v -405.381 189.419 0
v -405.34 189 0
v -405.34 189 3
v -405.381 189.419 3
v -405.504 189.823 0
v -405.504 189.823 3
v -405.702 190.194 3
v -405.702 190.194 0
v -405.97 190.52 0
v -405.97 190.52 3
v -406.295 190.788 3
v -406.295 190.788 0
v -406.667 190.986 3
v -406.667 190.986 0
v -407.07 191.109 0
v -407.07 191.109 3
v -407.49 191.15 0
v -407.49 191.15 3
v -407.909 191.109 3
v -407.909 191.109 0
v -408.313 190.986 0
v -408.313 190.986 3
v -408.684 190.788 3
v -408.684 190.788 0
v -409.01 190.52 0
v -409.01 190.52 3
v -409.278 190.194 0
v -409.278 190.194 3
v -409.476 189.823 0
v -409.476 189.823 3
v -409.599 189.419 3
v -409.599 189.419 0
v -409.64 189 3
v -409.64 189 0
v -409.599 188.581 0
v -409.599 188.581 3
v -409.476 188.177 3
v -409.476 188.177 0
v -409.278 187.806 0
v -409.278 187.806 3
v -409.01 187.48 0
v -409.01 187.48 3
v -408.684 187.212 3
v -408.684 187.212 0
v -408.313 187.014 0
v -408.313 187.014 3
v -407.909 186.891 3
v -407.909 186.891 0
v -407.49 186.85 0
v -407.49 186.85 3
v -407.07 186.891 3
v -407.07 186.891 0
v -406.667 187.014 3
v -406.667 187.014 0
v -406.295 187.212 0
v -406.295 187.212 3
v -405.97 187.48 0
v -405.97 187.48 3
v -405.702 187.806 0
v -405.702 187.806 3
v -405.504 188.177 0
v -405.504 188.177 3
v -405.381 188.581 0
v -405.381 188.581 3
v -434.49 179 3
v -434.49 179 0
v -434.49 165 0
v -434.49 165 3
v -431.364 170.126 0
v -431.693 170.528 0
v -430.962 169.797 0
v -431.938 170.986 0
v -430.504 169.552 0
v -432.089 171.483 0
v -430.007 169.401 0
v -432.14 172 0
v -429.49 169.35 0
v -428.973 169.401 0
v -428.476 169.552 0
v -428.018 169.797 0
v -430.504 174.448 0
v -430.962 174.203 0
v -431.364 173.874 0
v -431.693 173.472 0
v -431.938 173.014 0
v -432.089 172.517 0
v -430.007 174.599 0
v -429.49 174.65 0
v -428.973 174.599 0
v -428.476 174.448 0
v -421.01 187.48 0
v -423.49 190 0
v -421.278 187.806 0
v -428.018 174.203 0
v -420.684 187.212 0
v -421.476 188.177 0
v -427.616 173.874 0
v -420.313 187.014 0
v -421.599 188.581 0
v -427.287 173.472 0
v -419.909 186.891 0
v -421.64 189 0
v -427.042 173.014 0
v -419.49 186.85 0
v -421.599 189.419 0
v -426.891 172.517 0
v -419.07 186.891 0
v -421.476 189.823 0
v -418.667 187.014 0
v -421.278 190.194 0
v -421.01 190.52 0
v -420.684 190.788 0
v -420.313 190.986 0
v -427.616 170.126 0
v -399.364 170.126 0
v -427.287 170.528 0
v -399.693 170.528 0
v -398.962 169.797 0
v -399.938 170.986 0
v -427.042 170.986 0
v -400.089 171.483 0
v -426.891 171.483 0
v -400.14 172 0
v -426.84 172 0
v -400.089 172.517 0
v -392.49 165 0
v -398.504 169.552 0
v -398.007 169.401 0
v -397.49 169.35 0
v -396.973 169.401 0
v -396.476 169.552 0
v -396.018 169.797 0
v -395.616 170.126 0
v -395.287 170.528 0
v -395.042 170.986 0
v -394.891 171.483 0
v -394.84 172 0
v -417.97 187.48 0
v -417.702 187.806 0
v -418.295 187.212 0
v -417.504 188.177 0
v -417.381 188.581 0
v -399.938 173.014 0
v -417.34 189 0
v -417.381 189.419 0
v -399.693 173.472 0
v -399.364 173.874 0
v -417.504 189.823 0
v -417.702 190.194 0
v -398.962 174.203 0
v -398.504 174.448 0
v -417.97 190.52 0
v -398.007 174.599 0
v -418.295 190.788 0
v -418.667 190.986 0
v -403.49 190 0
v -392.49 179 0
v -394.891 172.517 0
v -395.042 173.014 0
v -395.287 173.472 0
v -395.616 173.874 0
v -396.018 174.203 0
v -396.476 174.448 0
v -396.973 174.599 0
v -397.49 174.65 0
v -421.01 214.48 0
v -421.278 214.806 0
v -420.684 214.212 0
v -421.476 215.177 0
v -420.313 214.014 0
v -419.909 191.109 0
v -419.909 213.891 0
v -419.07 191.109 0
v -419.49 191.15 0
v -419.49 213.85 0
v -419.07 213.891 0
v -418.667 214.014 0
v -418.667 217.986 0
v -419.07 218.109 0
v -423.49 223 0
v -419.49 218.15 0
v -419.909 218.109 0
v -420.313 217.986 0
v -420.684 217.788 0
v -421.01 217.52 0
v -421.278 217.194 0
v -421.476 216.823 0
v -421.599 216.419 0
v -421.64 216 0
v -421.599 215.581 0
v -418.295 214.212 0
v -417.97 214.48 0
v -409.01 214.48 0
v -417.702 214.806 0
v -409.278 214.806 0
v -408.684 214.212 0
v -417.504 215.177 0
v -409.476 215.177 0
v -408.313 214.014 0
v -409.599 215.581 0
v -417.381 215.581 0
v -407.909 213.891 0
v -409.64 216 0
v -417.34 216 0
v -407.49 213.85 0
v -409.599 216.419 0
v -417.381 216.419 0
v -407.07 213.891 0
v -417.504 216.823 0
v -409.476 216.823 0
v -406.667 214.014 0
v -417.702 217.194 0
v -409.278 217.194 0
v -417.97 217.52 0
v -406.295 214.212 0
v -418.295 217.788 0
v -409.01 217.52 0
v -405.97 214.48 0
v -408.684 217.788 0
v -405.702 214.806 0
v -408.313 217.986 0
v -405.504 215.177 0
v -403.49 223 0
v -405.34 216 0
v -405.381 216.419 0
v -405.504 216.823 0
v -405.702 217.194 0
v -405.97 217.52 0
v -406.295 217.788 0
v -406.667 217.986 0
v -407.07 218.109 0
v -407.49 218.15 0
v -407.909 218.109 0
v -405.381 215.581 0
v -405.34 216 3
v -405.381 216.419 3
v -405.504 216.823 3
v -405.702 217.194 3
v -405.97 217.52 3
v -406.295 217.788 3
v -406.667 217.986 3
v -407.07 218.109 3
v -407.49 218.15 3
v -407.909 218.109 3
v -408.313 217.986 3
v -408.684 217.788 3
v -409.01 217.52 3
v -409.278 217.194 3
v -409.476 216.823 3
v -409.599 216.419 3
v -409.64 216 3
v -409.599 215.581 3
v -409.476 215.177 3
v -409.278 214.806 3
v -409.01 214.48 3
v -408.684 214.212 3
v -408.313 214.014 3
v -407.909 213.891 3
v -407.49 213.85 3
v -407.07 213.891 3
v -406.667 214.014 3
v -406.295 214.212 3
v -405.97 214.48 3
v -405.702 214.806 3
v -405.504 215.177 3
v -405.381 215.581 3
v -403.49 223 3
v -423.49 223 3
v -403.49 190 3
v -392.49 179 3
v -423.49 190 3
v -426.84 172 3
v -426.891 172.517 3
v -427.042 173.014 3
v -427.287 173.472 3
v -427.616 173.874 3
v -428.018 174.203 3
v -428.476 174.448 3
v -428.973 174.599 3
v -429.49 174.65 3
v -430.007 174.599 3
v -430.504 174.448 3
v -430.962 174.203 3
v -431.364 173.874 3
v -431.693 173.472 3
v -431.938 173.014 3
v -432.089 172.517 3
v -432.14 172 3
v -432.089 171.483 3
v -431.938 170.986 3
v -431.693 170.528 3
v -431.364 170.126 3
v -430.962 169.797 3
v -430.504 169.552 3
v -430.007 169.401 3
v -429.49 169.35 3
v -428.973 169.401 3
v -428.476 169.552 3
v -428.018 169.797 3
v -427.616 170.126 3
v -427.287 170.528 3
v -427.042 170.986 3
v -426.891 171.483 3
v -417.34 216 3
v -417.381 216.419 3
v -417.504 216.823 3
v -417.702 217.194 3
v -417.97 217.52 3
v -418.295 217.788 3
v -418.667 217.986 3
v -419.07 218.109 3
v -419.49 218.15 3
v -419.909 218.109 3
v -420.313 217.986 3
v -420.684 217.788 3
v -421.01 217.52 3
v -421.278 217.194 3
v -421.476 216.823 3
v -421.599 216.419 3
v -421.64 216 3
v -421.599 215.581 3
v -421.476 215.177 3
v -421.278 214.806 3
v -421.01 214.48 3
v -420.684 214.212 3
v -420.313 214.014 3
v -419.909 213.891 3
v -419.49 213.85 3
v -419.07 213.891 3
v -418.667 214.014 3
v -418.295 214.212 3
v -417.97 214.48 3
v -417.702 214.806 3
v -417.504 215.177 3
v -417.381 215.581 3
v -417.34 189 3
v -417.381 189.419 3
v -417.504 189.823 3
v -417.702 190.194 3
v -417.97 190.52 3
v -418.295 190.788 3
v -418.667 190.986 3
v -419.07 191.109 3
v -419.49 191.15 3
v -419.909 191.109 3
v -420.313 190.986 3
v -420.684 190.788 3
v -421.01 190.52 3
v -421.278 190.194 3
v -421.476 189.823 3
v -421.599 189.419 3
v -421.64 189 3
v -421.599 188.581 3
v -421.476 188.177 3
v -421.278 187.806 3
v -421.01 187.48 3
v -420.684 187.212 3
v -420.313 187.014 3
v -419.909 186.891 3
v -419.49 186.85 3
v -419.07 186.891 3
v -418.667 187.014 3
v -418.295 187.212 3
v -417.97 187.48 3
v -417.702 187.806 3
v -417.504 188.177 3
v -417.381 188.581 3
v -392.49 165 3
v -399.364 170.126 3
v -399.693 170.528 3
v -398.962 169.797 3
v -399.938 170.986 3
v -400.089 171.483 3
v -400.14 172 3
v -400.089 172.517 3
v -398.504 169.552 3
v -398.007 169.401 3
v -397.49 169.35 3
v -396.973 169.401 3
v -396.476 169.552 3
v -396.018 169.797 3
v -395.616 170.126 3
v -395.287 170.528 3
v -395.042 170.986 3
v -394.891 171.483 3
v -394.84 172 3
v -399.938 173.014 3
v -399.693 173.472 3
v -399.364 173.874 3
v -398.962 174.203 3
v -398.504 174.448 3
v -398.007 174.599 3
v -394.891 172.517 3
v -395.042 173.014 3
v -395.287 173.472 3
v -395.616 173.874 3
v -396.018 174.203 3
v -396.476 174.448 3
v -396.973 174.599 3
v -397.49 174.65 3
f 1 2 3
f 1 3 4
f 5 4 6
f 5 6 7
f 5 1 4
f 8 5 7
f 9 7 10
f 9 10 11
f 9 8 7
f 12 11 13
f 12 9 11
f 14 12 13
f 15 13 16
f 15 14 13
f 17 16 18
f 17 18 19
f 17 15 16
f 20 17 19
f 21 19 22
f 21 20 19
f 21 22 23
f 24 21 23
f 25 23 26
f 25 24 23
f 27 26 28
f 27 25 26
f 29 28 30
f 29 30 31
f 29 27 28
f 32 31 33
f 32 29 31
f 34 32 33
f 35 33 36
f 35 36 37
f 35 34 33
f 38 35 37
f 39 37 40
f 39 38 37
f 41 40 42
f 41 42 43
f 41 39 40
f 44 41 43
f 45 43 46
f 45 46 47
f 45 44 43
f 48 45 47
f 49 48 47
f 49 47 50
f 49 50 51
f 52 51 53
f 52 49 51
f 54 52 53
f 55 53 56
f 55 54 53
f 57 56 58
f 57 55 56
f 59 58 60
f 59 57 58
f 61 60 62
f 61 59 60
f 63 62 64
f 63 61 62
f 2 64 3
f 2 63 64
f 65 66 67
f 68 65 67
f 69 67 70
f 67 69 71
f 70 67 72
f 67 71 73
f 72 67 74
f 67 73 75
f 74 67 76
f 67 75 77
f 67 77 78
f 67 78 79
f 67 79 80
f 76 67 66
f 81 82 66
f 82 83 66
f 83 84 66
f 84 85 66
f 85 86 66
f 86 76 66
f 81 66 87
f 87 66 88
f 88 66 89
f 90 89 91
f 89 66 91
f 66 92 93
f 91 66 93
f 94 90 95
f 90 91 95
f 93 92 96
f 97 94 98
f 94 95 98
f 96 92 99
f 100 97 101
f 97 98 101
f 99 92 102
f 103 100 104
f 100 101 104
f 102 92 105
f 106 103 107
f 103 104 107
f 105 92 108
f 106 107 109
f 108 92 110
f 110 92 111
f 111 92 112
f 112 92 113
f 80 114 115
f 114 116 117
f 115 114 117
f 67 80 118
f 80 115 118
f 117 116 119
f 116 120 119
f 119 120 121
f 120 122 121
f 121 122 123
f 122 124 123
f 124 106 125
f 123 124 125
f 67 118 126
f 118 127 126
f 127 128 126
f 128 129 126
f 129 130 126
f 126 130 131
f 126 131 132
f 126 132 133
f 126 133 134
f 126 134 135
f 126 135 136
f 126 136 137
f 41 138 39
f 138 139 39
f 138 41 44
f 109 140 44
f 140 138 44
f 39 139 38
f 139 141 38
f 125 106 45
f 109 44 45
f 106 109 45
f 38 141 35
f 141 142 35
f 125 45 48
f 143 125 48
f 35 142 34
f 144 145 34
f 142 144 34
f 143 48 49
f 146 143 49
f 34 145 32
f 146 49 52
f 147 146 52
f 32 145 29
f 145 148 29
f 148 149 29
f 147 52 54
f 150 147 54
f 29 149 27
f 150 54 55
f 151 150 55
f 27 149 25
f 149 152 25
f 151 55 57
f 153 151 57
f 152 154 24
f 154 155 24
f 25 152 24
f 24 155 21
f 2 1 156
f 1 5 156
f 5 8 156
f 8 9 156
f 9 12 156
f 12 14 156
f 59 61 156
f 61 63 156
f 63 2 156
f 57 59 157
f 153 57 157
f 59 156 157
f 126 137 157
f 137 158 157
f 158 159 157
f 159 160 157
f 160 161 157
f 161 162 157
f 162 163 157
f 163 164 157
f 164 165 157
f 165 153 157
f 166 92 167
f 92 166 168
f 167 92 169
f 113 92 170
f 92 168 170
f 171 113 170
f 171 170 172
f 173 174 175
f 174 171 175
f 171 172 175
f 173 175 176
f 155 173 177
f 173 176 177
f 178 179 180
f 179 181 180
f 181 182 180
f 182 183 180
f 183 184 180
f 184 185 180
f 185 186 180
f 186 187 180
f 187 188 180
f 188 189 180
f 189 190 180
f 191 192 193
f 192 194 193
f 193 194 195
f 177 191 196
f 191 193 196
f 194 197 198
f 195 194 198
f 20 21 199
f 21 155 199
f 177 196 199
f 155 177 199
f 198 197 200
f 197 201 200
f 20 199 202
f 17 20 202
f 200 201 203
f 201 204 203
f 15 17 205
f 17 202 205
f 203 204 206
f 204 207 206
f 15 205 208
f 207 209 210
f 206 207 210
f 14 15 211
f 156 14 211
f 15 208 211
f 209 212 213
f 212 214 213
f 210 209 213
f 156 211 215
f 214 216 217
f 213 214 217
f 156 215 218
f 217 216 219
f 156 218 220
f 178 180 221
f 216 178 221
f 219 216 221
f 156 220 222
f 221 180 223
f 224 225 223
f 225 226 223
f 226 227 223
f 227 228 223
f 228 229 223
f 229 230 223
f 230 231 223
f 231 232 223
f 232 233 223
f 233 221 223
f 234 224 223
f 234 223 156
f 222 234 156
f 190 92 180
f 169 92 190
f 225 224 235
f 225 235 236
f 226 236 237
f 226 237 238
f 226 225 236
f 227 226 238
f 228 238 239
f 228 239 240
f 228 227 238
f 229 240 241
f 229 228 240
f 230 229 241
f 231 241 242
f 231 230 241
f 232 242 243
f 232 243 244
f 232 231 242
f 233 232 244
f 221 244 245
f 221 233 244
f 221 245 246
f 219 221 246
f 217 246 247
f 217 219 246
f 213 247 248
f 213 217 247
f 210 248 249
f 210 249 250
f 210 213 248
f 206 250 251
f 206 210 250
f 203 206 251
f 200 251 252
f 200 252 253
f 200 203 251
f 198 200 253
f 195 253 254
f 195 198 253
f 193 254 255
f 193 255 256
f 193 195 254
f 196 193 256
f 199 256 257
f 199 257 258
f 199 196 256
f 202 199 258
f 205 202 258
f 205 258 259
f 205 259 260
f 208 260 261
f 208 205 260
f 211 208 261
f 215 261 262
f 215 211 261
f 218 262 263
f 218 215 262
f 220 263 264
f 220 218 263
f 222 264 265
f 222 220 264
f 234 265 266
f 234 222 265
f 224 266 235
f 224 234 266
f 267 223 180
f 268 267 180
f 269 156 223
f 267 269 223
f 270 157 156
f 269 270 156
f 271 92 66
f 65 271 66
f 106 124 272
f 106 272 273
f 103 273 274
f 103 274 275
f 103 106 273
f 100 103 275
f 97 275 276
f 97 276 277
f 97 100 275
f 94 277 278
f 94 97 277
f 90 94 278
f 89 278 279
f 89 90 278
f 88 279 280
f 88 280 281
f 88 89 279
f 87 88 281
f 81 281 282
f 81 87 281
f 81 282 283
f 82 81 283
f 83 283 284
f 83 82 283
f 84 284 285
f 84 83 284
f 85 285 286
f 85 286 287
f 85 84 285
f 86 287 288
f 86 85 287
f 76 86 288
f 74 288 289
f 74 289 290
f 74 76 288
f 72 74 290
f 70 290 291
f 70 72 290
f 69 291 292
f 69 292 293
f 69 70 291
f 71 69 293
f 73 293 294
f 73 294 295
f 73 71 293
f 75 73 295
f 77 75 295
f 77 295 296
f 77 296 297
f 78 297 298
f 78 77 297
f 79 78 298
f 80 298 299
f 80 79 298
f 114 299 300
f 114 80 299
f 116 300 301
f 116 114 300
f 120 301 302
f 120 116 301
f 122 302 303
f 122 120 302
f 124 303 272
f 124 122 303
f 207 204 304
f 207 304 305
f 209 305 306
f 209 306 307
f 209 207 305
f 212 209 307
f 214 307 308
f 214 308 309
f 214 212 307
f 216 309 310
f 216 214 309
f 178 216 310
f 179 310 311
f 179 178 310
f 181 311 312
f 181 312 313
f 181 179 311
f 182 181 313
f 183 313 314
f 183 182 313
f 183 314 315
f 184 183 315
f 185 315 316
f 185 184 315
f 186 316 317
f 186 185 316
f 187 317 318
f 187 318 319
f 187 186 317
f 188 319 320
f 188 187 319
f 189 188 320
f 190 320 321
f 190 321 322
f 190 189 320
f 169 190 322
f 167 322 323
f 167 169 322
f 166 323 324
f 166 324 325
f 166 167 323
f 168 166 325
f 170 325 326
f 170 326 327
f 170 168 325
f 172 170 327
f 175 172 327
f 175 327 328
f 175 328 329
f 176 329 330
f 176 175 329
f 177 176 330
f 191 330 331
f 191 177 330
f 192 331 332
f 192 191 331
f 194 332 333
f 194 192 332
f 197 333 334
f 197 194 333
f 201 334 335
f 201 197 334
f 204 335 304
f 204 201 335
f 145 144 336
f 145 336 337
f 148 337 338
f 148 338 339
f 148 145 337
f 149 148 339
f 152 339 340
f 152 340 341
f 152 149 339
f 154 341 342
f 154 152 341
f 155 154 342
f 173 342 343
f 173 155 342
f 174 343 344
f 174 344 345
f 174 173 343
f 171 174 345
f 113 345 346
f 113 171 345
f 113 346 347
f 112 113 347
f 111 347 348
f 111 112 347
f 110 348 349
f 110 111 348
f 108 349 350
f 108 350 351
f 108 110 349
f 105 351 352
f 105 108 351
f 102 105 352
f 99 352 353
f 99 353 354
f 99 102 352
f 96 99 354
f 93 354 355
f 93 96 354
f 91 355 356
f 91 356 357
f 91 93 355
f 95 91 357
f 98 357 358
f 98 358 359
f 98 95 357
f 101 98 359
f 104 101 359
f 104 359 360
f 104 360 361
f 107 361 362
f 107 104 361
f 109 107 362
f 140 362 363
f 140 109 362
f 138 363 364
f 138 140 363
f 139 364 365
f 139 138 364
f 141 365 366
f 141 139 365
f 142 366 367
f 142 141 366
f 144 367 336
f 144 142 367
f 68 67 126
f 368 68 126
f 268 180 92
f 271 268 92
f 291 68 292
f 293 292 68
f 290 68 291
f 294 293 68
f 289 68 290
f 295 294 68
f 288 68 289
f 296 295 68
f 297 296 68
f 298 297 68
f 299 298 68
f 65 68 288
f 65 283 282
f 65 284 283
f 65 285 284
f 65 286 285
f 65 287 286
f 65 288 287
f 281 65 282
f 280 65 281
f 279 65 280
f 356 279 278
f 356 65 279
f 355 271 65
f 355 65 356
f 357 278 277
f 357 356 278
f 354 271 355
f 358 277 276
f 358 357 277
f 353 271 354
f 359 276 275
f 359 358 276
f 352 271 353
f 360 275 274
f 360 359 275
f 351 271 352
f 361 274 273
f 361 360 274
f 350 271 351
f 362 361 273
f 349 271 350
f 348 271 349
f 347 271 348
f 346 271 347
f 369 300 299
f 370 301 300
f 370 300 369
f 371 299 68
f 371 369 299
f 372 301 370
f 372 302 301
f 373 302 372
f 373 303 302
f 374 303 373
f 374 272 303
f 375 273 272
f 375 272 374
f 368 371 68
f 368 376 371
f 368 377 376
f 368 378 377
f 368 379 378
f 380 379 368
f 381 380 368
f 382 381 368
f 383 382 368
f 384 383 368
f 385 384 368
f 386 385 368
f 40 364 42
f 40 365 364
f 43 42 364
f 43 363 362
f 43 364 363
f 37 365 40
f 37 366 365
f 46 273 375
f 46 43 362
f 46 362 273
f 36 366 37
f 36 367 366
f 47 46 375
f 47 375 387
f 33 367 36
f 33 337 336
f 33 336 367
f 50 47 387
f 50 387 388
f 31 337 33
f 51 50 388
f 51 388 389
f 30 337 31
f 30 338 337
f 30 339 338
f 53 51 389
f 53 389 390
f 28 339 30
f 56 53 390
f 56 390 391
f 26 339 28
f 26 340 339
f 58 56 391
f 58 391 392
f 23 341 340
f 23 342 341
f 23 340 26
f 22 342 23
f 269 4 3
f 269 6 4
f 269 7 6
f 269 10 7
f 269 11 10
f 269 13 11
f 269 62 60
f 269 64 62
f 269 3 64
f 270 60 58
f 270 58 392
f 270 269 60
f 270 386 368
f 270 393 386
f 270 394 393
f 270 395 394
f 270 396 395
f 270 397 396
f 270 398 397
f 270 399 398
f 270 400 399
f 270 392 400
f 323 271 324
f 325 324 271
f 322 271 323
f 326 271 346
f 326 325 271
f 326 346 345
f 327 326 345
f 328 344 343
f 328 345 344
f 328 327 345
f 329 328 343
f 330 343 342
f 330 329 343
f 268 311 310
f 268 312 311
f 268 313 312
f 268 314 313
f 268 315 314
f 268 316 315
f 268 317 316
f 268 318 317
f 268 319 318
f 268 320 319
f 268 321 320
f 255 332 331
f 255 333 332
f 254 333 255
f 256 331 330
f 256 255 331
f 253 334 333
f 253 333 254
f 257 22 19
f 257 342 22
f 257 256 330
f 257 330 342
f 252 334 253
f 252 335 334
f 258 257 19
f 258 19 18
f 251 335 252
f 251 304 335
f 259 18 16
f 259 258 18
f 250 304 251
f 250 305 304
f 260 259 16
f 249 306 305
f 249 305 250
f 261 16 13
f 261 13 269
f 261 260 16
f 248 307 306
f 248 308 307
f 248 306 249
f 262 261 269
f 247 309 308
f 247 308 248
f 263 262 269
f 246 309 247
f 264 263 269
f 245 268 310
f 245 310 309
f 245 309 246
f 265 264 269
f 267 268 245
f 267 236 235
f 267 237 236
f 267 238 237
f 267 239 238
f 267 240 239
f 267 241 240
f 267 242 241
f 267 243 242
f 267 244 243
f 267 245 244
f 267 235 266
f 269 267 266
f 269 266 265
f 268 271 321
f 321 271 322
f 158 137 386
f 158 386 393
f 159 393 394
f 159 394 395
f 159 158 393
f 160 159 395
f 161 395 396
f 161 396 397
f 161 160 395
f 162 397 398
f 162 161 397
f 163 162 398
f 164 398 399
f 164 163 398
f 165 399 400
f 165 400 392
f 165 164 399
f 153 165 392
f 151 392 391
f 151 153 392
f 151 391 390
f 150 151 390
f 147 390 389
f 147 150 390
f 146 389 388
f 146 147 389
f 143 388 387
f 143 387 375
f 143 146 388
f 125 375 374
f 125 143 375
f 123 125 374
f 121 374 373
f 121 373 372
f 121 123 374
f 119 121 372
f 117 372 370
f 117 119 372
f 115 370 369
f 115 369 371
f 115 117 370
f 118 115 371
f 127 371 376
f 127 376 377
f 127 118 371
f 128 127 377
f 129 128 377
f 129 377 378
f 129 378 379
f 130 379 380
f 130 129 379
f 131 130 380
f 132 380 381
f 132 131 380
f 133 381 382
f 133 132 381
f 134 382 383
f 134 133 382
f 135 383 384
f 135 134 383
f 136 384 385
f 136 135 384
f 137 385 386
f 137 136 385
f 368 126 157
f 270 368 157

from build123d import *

# Parameters (mm, degrees)
SKETCH2_R           = 2.65
SKETCH2_R_2         = 2.15
BOSS_EXTRUDE1_DEPTH = 3


with BuildPart() as part:
    # Sketch2 → Boss-Extrude1 (new body)
    with BuildSketch(Plane.XY):
        Polygon((-434.489921235, 165), (-392.489921235, 165), (-392.489921235, 179), (-403.489921235, 190), (-403.489921235, 223), (-423.489921235, 223), (-423.489921235, 190), (-434.489921235, 179), align=None)
        with Locations((-397.489921235, 172)):
            Circle(SKETCH2_R, mode=Mode.SUBTRACT)
        with Locations((-407.489921235, 216)):
            Circle(SKETCH2_R_2, mode=Mode.SUBTRACT)
        with Locations((-407.489921235, 189)):
            Circle(SKETCH2_R_2, mode=Mode.SUBTRACT)
        with Locations((-429.489921235, 172)):
            Circle(SKETCH2_R, mode=Mode.SUBTRACT)
        with Locations((-419.489921235, 189)):
            Circle(SKETCH2_R_2, mode=Mode.SUBTRACT)
        with Locations((-419.489921235, 216)):
            Circle(SKETCH2_R_2, mode=Mode.SUBTRACT)
    extrude(amount=BOSS_EXTRUDE1_DEPTH)


solid = part.part
